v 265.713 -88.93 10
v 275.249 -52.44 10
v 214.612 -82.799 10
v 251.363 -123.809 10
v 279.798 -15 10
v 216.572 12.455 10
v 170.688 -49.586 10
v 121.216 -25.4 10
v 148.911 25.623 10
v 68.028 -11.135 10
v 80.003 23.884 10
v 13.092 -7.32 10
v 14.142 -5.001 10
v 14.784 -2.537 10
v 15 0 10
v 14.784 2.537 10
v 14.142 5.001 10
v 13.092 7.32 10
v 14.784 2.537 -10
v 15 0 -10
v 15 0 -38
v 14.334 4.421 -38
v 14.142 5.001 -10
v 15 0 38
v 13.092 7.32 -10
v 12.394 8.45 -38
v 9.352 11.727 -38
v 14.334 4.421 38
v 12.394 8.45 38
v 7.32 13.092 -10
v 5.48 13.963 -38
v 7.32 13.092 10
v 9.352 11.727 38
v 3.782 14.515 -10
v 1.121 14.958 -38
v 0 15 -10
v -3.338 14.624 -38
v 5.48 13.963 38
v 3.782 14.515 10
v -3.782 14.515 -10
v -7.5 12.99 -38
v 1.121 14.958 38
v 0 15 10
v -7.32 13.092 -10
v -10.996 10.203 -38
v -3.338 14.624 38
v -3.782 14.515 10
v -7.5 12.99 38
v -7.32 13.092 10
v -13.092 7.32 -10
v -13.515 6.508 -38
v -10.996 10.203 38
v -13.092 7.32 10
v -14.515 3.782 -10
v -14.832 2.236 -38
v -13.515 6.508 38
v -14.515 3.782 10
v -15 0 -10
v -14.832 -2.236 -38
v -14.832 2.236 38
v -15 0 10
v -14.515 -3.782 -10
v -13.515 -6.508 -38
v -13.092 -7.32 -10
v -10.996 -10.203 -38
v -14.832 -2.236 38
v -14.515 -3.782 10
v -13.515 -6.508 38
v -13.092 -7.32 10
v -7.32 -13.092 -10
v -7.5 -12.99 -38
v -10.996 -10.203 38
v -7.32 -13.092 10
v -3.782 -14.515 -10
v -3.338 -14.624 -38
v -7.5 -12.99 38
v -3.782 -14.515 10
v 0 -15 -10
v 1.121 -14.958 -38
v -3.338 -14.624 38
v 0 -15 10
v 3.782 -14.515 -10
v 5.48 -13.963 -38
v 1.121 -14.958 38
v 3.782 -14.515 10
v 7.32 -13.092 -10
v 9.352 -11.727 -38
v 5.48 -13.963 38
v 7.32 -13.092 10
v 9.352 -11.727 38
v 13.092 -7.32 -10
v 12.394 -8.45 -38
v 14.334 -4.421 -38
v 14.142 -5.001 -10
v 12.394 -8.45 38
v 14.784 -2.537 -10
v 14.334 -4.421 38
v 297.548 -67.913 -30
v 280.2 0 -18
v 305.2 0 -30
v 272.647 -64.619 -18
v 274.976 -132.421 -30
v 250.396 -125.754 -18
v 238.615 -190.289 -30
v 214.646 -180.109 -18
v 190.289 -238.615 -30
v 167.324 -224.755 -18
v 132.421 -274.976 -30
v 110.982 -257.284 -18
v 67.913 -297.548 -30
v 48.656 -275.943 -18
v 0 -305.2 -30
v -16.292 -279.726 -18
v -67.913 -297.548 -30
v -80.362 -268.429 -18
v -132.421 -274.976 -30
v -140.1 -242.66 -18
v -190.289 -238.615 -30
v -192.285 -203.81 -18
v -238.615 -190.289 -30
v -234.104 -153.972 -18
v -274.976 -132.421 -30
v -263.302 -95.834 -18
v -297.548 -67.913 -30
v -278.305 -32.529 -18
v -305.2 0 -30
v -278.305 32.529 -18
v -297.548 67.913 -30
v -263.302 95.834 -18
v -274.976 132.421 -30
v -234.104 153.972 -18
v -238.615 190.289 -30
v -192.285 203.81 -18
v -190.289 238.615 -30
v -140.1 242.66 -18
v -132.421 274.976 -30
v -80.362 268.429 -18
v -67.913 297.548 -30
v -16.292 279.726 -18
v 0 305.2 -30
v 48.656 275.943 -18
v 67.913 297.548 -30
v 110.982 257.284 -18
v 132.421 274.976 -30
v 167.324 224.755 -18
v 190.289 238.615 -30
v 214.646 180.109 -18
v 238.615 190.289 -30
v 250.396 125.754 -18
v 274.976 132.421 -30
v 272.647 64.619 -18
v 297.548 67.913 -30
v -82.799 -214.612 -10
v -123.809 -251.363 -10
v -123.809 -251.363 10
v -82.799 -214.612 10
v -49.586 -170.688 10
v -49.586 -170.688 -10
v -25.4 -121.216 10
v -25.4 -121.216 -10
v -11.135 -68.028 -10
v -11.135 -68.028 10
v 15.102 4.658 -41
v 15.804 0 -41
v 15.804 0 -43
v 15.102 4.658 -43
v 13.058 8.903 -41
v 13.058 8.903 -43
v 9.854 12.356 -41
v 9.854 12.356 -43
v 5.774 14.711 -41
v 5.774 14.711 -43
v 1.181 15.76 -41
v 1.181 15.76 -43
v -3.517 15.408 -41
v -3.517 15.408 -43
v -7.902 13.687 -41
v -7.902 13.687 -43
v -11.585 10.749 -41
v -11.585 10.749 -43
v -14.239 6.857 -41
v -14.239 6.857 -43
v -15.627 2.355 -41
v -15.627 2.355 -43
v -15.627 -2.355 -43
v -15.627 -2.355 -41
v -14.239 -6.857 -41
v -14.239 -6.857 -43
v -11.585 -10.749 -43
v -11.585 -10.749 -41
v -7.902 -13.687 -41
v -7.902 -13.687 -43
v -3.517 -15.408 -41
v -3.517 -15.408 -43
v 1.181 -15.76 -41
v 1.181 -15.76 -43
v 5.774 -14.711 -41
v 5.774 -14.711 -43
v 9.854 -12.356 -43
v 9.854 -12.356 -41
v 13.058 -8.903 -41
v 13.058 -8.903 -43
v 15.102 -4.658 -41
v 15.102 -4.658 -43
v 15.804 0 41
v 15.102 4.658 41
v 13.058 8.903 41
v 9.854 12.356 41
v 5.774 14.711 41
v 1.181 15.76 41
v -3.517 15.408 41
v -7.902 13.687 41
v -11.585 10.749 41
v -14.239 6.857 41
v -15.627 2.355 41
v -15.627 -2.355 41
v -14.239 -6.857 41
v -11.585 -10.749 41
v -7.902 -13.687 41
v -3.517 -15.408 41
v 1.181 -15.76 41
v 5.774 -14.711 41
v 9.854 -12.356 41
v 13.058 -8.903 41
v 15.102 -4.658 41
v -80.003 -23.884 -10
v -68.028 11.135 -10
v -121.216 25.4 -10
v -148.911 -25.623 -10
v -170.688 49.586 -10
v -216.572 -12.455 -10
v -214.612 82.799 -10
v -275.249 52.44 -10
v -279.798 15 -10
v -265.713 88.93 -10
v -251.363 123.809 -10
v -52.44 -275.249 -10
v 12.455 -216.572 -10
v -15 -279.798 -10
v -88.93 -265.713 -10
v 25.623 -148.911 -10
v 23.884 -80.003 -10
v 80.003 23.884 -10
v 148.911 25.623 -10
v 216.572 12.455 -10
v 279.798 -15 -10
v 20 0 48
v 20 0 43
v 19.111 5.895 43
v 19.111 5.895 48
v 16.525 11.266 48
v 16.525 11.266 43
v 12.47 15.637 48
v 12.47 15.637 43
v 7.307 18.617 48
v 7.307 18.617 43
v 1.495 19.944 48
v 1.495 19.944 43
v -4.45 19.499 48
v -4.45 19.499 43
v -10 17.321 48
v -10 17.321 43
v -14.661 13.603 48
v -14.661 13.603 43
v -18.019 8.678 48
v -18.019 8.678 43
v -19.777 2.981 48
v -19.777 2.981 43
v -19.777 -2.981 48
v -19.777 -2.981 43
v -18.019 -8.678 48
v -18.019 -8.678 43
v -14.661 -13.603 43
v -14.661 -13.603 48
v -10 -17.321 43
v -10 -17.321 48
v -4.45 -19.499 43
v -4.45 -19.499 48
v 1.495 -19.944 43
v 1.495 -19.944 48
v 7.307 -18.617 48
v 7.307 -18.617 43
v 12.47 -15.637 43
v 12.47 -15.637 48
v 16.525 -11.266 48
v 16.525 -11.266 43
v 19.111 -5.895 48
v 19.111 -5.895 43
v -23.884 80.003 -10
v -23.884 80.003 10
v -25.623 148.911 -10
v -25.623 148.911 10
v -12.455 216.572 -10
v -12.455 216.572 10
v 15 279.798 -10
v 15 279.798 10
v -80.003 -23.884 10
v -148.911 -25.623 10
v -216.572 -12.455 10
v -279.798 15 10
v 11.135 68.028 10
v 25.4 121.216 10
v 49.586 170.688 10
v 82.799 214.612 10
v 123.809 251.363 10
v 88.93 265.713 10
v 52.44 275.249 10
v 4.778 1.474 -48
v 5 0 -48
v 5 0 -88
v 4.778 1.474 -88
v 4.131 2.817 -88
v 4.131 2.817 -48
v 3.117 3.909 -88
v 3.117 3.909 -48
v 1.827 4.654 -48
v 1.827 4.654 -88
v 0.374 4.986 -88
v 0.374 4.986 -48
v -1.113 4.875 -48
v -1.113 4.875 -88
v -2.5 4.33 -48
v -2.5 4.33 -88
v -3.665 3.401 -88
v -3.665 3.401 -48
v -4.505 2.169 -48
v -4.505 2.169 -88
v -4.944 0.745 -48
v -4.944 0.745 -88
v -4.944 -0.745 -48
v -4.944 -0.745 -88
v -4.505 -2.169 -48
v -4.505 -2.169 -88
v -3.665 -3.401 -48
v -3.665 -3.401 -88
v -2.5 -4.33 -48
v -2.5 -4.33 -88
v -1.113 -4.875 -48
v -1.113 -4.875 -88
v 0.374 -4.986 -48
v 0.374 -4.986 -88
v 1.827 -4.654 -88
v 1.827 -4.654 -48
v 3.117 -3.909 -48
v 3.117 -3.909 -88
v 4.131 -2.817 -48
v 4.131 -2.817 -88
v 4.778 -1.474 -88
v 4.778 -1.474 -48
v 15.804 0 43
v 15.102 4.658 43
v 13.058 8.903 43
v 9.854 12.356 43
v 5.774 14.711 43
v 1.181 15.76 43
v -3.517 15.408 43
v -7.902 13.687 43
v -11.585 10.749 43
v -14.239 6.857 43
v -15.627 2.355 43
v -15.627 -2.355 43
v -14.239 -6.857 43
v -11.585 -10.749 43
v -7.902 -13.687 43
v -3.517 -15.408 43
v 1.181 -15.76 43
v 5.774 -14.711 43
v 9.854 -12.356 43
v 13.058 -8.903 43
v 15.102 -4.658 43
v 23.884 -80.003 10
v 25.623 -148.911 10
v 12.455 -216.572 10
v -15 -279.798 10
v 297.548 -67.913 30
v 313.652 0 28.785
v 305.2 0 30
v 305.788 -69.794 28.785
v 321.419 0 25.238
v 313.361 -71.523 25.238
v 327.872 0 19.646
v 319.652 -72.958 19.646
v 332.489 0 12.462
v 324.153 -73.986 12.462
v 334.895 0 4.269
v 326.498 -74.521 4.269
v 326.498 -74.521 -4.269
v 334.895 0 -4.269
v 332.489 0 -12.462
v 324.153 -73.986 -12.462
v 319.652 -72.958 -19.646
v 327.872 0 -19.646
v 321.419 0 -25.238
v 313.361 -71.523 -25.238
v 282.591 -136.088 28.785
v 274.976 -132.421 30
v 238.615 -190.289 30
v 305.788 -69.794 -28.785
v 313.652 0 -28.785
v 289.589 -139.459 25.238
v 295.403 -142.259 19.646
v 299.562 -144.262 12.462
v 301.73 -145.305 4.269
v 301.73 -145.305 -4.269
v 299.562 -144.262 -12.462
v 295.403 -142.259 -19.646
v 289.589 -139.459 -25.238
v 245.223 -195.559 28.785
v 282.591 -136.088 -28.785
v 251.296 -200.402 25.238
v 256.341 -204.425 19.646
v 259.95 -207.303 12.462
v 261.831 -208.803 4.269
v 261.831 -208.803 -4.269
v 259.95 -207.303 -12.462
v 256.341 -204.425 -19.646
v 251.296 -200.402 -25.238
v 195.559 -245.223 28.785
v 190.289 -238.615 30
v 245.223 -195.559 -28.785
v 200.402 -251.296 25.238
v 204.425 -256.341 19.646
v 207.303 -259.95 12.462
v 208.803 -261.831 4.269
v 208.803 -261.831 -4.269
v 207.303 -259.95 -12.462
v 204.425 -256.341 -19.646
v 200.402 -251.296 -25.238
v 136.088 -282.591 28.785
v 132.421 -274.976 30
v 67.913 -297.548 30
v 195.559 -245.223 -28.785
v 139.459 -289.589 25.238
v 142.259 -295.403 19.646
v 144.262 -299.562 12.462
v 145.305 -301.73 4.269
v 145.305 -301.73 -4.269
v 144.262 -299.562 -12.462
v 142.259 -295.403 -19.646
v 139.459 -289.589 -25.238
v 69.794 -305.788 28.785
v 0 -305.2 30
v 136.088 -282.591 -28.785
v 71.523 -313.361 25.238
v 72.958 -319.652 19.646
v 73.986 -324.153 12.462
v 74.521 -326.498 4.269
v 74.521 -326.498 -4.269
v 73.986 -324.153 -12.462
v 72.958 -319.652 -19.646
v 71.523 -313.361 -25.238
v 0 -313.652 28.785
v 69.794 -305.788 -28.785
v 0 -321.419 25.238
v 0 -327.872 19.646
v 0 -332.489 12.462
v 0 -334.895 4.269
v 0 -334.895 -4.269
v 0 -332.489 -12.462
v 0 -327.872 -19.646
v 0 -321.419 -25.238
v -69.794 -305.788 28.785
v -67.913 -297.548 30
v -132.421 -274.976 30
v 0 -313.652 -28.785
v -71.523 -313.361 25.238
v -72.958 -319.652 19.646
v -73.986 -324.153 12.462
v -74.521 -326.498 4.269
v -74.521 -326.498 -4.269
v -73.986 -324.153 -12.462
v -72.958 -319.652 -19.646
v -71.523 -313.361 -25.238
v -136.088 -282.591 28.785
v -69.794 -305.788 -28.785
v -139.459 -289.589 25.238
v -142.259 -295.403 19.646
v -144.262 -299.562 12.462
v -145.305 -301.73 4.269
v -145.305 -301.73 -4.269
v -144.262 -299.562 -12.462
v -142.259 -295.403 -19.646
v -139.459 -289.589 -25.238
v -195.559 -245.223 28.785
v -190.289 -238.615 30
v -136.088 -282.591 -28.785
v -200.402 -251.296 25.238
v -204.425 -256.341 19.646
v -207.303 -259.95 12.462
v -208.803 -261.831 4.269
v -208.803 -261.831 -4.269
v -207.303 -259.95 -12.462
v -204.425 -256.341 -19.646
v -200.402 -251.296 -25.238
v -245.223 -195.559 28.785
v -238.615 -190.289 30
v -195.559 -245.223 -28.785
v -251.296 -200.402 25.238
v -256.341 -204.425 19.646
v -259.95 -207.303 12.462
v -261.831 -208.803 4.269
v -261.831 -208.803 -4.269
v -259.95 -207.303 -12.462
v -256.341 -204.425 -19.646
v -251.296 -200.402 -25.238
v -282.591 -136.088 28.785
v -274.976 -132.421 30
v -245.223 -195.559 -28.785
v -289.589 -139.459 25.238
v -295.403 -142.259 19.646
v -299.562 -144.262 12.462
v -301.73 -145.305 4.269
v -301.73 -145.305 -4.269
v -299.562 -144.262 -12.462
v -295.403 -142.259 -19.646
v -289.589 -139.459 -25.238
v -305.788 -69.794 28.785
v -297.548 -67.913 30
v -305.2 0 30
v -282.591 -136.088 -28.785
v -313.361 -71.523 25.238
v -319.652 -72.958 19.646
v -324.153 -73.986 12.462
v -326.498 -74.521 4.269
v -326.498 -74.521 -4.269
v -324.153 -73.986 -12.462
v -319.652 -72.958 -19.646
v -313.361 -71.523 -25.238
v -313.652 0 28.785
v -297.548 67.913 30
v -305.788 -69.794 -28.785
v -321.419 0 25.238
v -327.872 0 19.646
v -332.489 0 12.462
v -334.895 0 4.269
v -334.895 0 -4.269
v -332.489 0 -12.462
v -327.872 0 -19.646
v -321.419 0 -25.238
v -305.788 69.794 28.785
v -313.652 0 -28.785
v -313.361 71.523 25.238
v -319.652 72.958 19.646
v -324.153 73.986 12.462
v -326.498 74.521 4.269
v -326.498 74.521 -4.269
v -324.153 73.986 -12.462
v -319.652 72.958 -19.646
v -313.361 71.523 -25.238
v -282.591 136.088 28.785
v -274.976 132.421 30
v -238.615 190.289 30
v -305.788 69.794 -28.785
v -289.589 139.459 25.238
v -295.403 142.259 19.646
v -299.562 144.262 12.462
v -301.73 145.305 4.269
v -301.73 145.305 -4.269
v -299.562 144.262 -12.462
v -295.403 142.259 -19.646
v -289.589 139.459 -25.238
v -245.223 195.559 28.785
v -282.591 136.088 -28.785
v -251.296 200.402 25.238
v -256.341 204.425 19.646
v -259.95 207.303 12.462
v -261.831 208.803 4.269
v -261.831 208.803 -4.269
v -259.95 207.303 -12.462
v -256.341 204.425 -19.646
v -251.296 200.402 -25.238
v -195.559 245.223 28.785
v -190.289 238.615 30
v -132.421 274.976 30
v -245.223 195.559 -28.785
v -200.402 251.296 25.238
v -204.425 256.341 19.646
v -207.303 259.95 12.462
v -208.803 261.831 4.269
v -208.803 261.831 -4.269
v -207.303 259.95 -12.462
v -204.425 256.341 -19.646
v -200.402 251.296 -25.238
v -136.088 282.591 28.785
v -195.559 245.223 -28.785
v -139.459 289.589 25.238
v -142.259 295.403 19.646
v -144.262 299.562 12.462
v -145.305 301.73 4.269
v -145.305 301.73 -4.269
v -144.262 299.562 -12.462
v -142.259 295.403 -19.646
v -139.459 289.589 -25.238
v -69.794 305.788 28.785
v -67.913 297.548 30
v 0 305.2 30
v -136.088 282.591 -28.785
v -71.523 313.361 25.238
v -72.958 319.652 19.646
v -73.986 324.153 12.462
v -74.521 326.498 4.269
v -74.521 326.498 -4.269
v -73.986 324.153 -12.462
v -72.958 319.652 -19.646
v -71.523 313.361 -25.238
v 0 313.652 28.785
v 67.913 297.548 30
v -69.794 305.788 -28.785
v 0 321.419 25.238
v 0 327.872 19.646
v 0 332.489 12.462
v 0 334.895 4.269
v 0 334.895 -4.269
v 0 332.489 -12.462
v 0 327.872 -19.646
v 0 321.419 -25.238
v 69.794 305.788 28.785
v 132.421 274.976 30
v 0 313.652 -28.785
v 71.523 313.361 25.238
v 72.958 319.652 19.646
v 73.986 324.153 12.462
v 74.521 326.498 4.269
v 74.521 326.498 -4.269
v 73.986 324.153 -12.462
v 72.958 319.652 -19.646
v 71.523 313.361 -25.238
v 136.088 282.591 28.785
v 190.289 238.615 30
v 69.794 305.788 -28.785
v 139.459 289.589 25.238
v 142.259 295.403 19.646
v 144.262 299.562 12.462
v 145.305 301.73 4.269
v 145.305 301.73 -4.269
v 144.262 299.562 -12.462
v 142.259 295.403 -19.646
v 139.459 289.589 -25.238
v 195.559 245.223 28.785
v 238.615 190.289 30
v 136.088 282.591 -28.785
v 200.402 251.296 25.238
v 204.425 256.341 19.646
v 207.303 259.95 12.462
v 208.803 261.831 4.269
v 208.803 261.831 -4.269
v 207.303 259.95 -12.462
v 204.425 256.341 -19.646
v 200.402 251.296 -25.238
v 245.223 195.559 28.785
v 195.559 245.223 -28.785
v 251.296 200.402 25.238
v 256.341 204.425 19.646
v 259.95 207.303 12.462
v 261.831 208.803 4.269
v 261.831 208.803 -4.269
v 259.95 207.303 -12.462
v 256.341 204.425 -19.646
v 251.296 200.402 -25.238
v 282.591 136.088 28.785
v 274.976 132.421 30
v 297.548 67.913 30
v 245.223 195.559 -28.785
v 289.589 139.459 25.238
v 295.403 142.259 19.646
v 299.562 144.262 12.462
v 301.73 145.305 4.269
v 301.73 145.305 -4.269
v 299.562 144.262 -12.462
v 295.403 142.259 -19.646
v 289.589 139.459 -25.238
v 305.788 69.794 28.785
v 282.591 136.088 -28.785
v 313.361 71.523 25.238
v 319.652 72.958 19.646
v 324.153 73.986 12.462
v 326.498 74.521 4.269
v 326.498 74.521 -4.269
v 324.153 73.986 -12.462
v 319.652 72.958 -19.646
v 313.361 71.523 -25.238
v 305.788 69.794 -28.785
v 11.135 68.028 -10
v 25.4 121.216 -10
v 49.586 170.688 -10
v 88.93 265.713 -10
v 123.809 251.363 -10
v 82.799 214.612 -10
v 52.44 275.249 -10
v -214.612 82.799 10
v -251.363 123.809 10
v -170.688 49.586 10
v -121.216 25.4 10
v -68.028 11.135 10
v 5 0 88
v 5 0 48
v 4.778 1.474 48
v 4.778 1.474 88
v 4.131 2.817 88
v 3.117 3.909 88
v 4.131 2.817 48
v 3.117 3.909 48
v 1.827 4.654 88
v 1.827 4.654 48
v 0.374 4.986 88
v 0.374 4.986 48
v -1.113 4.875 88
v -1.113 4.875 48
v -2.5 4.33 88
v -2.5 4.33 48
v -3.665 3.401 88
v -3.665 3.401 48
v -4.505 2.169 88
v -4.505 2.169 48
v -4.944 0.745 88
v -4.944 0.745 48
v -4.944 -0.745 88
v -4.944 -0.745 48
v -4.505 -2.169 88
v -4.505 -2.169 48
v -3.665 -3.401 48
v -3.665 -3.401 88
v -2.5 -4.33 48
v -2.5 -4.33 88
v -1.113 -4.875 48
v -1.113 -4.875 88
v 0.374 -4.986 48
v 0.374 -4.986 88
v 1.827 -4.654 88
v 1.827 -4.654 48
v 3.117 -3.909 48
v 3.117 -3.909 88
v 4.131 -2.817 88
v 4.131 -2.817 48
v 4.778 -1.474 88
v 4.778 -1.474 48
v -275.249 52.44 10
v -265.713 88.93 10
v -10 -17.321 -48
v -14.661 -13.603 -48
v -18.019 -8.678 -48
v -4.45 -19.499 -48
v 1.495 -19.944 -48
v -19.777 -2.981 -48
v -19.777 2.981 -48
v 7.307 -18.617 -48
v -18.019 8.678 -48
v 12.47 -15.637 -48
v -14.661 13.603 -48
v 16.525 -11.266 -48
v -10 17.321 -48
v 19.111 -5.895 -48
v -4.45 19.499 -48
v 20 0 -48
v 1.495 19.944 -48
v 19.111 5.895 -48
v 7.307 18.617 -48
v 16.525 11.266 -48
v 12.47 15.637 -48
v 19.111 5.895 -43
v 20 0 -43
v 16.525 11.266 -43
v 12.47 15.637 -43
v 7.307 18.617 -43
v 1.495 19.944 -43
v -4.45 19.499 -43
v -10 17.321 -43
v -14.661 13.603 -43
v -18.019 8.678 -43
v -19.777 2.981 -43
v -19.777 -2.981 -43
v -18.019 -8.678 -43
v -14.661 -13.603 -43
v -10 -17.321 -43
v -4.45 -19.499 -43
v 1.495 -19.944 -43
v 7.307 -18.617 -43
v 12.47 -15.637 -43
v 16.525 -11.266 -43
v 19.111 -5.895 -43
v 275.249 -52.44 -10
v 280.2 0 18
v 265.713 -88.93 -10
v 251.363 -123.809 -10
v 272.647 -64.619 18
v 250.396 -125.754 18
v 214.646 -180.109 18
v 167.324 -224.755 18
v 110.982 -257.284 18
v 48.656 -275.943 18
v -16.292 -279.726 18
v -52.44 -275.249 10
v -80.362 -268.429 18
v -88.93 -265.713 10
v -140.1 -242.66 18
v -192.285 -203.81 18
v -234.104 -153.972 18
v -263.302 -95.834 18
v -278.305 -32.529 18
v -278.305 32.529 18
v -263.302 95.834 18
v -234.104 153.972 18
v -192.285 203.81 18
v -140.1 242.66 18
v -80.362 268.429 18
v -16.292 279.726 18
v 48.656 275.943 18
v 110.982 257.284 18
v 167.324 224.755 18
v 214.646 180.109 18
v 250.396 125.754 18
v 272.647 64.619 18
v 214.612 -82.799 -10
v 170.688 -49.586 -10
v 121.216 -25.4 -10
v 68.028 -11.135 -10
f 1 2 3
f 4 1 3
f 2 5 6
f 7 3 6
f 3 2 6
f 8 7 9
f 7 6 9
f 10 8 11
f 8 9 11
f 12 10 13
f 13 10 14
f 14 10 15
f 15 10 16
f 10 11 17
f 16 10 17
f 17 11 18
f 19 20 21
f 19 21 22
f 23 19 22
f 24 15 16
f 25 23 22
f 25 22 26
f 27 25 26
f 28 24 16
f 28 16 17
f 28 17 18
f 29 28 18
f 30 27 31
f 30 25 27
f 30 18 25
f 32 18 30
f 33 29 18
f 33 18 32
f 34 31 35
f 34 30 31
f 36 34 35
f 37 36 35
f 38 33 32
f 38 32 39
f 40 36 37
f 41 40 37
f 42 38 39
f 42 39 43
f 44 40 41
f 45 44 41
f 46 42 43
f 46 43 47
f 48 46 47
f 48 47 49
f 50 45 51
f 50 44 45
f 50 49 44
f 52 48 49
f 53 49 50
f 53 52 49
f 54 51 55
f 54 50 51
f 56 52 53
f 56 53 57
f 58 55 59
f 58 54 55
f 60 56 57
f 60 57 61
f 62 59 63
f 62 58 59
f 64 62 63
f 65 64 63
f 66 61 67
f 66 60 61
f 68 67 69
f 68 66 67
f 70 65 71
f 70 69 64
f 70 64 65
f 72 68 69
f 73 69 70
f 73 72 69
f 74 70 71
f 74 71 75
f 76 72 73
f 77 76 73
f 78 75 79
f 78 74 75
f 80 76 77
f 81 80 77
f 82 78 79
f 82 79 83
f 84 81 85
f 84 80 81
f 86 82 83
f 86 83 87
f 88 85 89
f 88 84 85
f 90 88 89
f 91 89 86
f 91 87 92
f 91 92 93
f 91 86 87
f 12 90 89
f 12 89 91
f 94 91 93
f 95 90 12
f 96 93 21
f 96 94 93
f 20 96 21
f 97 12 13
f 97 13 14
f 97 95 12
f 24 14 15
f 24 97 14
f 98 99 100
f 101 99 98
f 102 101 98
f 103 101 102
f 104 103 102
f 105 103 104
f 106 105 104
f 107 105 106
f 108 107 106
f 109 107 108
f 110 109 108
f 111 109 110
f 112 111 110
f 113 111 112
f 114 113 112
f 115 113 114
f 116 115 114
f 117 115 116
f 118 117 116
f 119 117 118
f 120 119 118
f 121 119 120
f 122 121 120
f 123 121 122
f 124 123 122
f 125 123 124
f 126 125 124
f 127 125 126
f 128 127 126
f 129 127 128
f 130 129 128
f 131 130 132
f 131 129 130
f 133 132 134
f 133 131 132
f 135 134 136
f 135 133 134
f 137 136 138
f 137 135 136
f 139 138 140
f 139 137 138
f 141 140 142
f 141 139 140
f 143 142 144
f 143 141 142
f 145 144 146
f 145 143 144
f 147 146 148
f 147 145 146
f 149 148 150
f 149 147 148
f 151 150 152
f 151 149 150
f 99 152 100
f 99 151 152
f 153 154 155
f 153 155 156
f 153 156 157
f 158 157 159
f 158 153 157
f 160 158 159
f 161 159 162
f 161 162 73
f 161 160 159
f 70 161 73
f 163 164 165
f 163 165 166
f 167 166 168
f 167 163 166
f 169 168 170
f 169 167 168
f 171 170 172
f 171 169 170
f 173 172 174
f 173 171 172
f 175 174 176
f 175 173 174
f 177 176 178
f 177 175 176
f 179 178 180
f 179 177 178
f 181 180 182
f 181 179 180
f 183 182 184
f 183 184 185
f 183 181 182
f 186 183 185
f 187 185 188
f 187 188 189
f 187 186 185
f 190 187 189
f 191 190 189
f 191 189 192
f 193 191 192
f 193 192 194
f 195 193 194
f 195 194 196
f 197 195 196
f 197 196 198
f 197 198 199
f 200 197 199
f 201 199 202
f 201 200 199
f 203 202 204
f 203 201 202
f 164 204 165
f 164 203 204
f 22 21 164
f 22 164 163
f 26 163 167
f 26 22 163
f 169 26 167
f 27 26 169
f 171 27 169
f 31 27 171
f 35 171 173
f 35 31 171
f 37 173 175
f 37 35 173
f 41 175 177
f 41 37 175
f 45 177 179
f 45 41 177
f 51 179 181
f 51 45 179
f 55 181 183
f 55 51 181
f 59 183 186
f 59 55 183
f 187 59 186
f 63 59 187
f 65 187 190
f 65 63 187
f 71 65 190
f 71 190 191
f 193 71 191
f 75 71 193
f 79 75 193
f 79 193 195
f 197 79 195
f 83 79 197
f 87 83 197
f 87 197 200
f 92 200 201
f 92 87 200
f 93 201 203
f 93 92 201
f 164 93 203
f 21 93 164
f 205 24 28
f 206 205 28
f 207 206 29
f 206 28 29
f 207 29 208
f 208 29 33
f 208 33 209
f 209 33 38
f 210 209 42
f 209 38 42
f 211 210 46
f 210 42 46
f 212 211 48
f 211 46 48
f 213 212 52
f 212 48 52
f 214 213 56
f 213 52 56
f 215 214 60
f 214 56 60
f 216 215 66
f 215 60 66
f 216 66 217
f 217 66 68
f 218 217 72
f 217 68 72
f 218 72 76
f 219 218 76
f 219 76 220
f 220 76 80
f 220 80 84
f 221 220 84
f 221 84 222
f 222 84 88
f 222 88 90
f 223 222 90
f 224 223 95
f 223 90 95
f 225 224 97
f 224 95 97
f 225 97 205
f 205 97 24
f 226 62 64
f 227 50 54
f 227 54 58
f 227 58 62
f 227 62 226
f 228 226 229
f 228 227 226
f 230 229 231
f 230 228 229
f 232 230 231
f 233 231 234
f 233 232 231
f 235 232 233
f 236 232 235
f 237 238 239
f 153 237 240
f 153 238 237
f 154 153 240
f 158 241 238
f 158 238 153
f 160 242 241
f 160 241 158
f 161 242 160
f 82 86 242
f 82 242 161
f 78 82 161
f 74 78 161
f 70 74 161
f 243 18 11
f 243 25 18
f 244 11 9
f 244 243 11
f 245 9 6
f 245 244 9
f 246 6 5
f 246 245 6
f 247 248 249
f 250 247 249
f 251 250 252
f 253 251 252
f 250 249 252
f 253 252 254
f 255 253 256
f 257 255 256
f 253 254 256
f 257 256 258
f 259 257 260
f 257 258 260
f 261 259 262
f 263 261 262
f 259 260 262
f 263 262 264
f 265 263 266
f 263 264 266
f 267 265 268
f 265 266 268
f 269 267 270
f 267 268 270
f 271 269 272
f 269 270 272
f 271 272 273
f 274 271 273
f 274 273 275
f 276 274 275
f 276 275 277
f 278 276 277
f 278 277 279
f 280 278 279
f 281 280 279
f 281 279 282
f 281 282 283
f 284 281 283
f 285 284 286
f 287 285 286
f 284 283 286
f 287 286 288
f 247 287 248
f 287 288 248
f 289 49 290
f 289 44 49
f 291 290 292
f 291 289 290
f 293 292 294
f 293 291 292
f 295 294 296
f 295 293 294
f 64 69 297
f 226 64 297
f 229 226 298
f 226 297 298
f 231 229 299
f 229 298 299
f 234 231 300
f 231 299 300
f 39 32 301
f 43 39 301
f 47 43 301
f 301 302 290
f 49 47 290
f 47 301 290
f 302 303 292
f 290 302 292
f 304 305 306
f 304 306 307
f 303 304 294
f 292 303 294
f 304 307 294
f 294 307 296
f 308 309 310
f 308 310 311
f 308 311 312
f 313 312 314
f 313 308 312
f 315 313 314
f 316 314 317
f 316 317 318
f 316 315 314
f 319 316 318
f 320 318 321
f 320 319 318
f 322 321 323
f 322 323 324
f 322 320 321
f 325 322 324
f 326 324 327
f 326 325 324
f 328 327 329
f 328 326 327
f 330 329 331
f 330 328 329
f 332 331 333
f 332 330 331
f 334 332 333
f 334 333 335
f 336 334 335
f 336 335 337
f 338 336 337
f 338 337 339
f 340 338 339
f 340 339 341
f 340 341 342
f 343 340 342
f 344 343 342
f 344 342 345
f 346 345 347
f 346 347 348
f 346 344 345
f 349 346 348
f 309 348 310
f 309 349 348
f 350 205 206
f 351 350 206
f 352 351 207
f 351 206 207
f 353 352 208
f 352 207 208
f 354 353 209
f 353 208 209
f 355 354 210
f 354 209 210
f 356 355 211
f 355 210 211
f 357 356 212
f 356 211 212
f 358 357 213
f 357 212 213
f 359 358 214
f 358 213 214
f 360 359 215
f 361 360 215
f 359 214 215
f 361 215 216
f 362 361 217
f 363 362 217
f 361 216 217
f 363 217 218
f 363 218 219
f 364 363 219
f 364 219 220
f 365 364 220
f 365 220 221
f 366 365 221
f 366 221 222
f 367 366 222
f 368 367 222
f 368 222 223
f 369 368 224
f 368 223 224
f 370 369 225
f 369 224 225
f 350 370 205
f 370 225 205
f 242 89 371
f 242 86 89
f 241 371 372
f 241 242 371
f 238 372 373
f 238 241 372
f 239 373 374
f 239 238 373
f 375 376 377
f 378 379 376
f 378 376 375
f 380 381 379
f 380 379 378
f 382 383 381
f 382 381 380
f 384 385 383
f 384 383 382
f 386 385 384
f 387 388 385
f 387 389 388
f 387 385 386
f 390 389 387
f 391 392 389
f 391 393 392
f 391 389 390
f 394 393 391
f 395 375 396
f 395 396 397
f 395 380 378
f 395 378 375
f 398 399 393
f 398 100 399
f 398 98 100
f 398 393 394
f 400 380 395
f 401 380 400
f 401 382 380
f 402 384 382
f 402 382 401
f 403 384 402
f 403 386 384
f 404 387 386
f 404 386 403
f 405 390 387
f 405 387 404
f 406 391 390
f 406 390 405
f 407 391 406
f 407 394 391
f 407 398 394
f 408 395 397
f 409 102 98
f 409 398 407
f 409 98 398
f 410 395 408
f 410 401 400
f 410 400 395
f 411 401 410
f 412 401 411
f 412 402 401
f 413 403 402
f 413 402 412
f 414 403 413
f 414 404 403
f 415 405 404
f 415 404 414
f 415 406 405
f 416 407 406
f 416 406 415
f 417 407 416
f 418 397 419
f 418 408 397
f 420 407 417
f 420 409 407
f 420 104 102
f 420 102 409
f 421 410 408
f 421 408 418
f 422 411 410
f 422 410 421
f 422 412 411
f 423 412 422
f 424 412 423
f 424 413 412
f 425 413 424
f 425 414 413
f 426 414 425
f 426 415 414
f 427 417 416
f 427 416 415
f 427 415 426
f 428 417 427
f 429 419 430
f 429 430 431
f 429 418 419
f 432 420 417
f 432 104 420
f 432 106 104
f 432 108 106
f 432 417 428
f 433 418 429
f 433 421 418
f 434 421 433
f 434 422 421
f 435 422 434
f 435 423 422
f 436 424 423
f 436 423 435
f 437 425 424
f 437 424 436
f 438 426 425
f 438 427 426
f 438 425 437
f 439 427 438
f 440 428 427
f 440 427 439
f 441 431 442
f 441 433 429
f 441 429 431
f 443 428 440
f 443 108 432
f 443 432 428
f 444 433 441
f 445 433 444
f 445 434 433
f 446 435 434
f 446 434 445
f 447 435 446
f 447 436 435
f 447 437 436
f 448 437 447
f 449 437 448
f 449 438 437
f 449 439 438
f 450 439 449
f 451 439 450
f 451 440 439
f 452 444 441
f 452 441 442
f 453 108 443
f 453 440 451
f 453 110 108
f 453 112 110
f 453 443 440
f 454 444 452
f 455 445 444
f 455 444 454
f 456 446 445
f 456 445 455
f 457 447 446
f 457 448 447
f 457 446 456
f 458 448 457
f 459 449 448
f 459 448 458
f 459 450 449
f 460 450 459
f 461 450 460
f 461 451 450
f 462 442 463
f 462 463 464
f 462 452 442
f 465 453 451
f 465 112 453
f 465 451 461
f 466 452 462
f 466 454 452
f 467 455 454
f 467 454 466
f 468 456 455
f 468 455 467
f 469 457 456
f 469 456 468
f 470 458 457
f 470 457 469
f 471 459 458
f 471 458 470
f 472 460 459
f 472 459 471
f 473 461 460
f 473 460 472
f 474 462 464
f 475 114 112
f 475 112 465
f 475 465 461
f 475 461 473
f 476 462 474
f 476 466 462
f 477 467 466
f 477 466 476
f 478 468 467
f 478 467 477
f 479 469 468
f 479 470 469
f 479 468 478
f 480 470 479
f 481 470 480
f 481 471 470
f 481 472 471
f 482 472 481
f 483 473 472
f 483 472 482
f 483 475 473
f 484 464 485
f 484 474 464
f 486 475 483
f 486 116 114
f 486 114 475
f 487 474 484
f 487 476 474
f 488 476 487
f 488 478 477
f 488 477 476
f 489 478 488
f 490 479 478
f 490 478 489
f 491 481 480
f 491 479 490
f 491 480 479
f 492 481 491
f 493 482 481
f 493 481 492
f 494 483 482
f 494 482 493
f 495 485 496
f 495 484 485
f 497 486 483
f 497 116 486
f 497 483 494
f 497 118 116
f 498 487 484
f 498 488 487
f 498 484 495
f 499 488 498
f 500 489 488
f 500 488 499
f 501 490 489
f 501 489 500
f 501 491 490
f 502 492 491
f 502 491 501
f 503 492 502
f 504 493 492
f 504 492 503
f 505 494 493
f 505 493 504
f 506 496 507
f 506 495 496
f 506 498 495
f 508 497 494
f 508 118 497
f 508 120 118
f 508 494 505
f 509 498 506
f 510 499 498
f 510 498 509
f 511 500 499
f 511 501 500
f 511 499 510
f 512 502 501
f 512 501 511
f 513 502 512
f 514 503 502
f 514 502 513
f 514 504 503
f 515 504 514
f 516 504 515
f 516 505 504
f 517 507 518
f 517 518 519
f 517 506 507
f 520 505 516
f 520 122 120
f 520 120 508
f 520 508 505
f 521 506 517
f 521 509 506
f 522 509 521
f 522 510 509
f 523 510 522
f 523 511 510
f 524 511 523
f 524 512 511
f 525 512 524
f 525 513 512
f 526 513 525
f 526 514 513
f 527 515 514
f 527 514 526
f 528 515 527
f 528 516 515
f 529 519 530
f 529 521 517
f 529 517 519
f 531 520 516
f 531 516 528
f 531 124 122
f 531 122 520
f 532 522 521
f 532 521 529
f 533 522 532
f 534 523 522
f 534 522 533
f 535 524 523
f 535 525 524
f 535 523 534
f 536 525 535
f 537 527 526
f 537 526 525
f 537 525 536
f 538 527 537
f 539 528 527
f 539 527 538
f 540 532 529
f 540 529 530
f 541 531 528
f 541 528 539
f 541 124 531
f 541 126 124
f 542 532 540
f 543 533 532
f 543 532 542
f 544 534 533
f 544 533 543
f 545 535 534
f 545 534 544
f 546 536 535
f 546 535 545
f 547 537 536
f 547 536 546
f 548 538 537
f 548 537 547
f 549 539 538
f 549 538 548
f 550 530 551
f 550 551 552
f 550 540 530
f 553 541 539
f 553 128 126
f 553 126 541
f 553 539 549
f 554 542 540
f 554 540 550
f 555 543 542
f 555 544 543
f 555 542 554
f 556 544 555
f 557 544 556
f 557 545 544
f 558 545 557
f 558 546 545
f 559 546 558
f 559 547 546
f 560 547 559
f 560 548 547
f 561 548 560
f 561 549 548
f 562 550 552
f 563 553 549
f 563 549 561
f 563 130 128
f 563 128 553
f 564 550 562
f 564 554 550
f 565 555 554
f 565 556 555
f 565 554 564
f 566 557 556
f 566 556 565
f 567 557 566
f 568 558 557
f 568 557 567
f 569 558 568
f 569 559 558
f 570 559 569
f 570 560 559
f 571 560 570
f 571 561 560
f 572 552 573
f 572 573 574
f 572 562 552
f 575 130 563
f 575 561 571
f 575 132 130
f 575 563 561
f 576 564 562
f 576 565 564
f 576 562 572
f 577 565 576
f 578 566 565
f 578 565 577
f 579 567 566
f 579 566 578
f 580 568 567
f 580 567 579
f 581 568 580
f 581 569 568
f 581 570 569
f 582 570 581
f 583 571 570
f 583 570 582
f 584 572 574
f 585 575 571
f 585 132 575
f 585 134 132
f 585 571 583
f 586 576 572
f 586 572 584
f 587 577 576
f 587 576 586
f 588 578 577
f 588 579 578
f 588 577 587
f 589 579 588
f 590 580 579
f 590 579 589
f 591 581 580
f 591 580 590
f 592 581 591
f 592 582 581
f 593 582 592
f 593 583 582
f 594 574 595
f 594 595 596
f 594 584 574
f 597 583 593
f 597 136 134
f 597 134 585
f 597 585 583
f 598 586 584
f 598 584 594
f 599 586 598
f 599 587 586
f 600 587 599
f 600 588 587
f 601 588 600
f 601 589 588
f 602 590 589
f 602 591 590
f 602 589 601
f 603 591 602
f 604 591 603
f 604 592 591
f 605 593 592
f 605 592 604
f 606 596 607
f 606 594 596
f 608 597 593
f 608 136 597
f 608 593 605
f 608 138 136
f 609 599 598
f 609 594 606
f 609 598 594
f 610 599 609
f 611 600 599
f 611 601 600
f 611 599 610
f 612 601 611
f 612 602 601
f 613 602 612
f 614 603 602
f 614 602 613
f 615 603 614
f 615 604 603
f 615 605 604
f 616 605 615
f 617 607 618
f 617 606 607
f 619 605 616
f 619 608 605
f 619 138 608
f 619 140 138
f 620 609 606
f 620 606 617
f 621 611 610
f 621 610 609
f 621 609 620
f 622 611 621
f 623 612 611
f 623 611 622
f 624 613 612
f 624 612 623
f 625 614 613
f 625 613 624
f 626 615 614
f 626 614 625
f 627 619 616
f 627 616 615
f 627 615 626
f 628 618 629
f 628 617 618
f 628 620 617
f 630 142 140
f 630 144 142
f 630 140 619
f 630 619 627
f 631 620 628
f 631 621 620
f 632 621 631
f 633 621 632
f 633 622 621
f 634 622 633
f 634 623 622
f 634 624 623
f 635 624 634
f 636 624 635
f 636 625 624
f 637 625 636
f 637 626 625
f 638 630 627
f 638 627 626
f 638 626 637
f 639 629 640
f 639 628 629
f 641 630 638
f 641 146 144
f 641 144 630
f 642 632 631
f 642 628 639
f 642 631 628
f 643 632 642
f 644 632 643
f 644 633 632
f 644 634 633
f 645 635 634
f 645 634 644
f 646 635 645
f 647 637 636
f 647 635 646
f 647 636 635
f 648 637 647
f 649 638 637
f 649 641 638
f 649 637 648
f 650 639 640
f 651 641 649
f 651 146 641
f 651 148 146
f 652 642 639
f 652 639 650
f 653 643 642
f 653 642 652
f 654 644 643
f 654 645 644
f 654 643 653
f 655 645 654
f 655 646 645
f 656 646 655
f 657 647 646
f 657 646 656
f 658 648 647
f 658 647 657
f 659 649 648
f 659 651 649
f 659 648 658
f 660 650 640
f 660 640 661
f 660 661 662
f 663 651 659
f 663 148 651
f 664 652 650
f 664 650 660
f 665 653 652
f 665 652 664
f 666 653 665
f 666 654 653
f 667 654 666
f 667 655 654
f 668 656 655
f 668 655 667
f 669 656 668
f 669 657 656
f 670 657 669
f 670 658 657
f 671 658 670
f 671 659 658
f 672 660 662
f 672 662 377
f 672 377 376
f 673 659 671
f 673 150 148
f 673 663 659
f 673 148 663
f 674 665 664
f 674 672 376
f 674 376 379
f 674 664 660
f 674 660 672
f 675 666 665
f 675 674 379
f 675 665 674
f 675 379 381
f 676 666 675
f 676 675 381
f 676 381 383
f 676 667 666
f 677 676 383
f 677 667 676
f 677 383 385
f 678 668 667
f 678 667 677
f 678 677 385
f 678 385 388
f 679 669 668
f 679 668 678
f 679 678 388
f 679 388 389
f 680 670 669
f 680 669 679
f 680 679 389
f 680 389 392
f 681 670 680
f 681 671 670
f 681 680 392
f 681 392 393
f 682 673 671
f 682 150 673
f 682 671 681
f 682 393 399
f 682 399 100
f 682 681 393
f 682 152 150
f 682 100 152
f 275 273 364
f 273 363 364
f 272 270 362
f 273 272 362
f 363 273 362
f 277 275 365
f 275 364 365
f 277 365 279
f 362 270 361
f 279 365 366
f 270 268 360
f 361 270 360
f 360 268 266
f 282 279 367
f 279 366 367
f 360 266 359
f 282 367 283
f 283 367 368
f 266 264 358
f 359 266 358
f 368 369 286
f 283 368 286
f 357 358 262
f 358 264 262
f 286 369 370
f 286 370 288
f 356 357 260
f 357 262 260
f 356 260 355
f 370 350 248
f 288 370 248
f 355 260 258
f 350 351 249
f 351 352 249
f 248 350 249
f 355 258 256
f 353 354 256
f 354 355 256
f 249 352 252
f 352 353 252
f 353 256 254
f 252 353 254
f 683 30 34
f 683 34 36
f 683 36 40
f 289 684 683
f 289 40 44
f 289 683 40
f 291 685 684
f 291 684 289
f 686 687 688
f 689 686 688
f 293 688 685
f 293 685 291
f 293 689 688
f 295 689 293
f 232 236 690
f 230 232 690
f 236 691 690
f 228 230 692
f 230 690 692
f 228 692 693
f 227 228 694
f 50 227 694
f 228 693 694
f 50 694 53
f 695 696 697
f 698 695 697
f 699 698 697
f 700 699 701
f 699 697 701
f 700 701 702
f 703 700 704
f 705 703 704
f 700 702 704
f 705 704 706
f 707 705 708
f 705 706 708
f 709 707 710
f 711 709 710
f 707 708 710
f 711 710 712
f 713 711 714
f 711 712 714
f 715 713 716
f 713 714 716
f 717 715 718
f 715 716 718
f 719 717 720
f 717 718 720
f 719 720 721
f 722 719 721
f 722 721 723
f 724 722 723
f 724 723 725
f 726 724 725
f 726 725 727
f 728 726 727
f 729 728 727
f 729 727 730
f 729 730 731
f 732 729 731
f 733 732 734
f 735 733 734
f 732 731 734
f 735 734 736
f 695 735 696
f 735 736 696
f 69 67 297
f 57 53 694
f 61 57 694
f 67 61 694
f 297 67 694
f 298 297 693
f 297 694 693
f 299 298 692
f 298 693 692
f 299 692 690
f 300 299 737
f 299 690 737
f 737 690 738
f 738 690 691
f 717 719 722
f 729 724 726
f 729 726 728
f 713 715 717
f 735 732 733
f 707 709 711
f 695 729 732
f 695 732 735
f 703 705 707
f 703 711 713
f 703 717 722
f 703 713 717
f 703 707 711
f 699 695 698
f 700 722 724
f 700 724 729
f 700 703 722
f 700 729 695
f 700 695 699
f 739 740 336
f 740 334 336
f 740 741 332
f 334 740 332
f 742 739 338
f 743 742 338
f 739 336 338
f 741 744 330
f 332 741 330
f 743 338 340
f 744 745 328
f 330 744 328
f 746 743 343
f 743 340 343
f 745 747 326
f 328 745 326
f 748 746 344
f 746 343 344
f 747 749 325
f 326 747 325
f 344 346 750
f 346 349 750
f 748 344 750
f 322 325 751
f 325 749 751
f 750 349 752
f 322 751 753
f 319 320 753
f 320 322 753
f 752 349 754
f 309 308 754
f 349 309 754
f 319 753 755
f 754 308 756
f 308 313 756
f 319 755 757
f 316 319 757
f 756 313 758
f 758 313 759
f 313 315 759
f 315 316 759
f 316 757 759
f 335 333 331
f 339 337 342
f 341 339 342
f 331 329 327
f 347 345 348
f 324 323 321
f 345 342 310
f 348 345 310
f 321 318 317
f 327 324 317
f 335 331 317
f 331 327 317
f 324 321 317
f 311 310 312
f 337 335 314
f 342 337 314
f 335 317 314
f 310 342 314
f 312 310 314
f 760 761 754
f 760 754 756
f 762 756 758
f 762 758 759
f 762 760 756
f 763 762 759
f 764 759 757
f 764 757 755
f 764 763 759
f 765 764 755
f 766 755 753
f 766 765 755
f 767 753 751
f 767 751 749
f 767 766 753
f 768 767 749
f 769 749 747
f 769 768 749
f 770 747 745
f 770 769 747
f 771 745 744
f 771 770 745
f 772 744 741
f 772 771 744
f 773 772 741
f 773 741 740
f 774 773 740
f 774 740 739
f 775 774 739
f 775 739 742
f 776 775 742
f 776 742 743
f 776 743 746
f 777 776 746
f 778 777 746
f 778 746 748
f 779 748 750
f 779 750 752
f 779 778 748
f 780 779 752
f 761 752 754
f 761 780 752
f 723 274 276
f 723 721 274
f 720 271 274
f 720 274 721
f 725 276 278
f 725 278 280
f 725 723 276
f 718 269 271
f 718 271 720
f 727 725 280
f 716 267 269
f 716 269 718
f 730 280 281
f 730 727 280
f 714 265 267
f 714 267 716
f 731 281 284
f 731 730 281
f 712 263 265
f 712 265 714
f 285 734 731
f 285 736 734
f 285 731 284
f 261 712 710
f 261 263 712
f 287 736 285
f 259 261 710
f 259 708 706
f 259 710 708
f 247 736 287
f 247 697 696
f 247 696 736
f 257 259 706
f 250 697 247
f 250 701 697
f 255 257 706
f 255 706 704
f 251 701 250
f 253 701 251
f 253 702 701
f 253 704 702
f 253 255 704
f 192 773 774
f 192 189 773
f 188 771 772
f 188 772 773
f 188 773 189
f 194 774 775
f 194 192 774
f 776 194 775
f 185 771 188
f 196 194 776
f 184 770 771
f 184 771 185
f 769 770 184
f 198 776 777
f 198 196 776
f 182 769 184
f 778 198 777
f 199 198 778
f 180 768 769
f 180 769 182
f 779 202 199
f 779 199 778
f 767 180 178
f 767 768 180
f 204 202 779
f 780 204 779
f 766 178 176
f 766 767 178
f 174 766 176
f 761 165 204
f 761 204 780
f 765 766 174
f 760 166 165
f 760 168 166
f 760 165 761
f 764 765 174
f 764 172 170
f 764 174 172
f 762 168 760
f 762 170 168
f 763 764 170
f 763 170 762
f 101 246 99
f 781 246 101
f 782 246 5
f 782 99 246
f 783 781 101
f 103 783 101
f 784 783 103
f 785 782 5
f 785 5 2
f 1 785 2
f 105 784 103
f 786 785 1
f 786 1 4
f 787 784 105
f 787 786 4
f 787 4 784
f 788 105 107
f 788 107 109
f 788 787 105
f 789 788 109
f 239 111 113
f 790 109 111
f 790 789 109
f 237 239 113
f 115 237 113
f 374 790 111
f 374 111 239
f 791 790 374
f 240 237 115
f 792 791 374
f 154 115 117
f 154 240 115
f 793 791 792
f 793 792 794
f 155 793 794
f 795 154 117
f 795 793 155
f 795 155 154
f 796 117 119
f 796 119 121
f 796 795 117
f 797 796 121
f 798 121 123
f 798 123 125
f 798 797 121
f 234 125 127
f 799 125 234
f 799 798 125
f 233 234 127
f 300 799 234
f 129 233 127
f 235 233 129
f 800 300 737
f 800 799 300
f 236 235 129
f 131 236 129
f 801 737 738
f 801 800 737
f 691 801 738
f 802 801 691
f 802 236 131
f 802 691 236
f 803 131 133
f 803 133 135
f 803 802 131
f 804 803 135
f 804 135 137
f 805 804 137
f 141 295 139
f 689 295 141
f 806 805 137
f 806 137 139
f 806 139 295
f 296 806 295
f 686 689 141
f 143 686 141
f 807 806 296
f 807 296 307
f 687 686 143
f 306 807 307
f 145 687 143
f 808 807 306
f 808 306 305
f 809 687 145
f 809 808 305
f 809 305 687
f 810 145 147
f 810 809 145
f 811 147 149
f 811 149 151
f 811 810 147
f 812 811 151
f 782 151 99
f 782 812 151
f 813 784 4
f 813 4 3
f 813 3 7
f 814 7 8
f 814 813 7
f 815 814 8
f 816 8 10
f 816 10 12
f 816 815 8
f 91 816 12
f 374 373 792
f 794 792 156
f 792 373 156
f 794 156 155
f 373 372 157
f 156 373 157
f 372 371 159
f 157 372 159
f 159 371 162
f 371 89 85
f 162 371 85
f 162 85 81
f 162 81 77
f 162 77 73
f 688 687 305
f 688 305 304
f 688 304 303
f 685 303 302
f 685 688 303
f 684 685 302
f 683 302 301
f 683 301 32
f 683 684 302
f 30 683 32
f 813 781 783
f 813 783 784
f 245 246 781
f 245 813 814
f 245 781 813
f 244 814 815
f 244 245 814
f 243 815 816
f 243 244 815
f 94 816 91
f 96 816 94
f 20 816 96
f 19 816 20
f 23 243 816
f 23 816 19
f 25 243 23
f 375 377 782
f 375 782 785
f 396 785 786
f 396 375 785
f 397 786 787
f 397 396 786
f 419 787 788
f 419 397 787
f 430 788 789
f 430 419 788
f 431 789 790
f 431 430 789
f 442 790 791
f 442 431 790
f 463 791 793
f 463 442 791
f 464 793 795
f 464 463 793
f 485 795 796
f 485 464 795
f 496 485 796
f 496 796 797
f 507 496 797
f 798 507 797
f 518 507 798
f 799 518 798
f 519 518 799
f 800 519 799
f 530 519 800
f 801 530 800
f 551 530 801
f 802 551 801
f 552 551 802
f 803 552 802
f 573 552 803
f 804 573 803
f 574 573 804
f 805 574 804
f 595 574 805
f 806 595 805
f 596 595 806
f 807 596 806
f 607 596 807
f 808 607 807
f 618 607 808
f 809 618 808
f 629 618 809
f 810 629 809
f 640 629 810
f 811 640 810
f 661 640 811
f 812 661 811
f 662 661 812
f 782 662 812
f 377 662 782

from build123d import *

# Parameters (mm, degrees)
SKETCH1_R            = 15
BOSS_EXTRUDE1_DEPTH  = 38
SKETCH2_R            = 15
BOSS_EXTRUDE2_DEPTH  = 3
BOSS_EXTRUDE2_DRAFT  = -15
SKETCH3_R            = 15.803847577
BOSS_EXTRUDE3_DEPTH  = 2
SKETCH4_R            = 20
BOSS_EXTRUDE4_DEPTH  = 5
SKETCH5_R            = 5
BOSS_EXTRUDE5_DEPTH  = 40
BOSS_EXTRUDE14_DEPTH = 10


with BuildPart() as part:
    # Sketch1 → Boss-Extrude1 (new body)
    with BuildSketch(Plane.XY):
        Circle(SKETCH1_R)
    extrude(amount=BOSS_EXTRUDE1_DEPTH)


with BuildPart() as boss_extrude2_tool:
    # Sketch2 → Boss-Extrude2 (with draft: the straight prism first)
    with BuildSketch(Plane.XY.offset(38)):
        Circle(SKETCH2_R)
    extrude(amount=BOSS_EXTRUDE2_DEPTH)
    # Boss-Extrude2: the draft: its side faces are tilted about the plane it starts from
    boss_extrude2_sides = [boss_extrude2_tool.faces().sort_by_distance(p)[0] for p in [
        (-15, 0, 39.5),
    ]]
    draft(boss_extrude2_sides, Plane.XY.offset(38), BOSS_EXTRUDE2_DRAFT)


with BuildPart() as part_1:
    add(part.part)

    # Boss-Extrude2: add boss_extrude2_tool
    add(boss_extrude2_tool.part)

    # Sketch3 → Boss-Extrude3 (add)
    with BuildSketch(Plane.XY.offset(41)):
        Circle(SKETCH3_R)
    extrude(amount=BOSS_EXTRUDE3_DEPTH)

    # Sketch4 → Boss-Extrude4 (add)
    with BuildSketch(Plane.XY.offset(43)):
        Circle(SKETCH4_R)
    extrude(amount=BOSS_EXTRUDE4_DEPTH)

    # Sketch5 → Boss-Extrude5 (add)
    with BuildSketch(Plane.XY.offset(48)):
        Circle(SKETCH5_R)
    extrude(amount=BOSS_EXTRUDE5_DEPTH)

    # Mirror1: part across plane


with BuildPart() as part_2:
    add(part_1.part)
    add(part_1.part.mirror(Plane.XY))



with BuildPart() as body_2:
    # Sketch6 → Revolve1 (revolve)
    with BuildSketch(Plane(origin=(0, 0, 0), x_dir=(0, 0, -1), z_dir=(1, 0, 0)), mode=Mode.PRIVATE) as revolve1_sk:
        Polygon((-30, 305.2), (30, 305.2), (18, 280.2), (-18, 280.2), align=None)
    revolve(revolve1_sk.sketch.rotate(Axis((0, 0, 38), (0, 0, -1)), 90), axis=Axis((0, 0, 38), (0, 0, -1)))


with BuildPart() as part_3:
    add(part_2.part)

    add(body_2.part)  # Boss-Extrude14 merges body 2
    # Sketch7 → Boss-Extrude14 (add, symmetric)
    with BuildSketch(Plane.XY):
        with BuildLine():
            ThreePointArc((-7.320383178, 13.09244019), (-25.622638941, 148.911014187), (15, 279.798213004))
            ThreePointArc((15, 279.798213004), (70.845559028, 271.0958258), (123.808589933, 251.363229329))
            ThreePointArc((123.808589933, 251.363229329), (36.300695478, 146.53460966), (7.320383178, 13.09244019))
            ThreePointArc((7.320383178, 13.09244019), (0, 15), (-7.320383178, 13.09244019))
        make_face()
        with BuildLine():
            ThreePointArc((13.09244019, 7.320383178), (148.911014187, 25.622638941), (279.798213004, -15))
            ThreePointArc((279.798213004, -15), (271.0958258, -70.845559028), (251.363229329, -123.808589933))
            ThreePointArc((251.363229329, -123.808589933), (146.53460966, -36.300695478), (13.09244019, -7.320383178))
            ThreePointArc((13.09244019, -7.320383178), (15, 0), (13.09244019, 7.320383178))
        make_face()
        with BuildLine():
            ThreePointArc((7.320383178, -13.09244019), (25.622638941, -148.911014187), (-15, -279.798213004))
            ThreePointArc((-15, -279.798213004), (-70.845559028, -271.0958258), (-123.808589933, -251.363229329))
            ThreePointArc((-123.808589933, -251.363229329), (-36.300695478, -146.53460966), (-7.320383178, -13.09244019))
            ThreePointArc((-7.320383178, -13.09244019), (0, -15), (7.320383178, -13.09244019))
        make_face()
        with BuildLine():
            ThreePointArc((-13.09244019, -7.320383178), (-148.911014187, -25.622638941), (-279.798213004, 15))
            ThreePointArc((-279.798213004, 15), (-271.0958258, 70.845559028), (-251.363229329, 123.808589933))
            ThreePointArc((-251.363229329, 123.808589933), (-146.53460966, 36.300695478), (-13.09244019, 7.320383178))
            ThreePointArc((-13.09244019, 7.320383178), (-15, 0), (-13.09244019, -7.320383178))
        make_face()
    extrude(amount=BOSS_EXTRUDE14_DEPTH, both=True)

    # Sketch8 → Revolve2 (revolve)
    with BuildSketch(Plane(origin=(0, 0, 0), x_dir=(1, 0, 0), z_dir=(0, 1, 0))):
        with BuildLine():
            Line((305.2, 30), (305.2, -30))
            ThreePointArc((305.2, -30), (335.2, 0), (305.2, 30))
        make_face()
    revolve(axis=Axis((0, 0, 38), (0, 0, -1)))


solid = part_3.part
